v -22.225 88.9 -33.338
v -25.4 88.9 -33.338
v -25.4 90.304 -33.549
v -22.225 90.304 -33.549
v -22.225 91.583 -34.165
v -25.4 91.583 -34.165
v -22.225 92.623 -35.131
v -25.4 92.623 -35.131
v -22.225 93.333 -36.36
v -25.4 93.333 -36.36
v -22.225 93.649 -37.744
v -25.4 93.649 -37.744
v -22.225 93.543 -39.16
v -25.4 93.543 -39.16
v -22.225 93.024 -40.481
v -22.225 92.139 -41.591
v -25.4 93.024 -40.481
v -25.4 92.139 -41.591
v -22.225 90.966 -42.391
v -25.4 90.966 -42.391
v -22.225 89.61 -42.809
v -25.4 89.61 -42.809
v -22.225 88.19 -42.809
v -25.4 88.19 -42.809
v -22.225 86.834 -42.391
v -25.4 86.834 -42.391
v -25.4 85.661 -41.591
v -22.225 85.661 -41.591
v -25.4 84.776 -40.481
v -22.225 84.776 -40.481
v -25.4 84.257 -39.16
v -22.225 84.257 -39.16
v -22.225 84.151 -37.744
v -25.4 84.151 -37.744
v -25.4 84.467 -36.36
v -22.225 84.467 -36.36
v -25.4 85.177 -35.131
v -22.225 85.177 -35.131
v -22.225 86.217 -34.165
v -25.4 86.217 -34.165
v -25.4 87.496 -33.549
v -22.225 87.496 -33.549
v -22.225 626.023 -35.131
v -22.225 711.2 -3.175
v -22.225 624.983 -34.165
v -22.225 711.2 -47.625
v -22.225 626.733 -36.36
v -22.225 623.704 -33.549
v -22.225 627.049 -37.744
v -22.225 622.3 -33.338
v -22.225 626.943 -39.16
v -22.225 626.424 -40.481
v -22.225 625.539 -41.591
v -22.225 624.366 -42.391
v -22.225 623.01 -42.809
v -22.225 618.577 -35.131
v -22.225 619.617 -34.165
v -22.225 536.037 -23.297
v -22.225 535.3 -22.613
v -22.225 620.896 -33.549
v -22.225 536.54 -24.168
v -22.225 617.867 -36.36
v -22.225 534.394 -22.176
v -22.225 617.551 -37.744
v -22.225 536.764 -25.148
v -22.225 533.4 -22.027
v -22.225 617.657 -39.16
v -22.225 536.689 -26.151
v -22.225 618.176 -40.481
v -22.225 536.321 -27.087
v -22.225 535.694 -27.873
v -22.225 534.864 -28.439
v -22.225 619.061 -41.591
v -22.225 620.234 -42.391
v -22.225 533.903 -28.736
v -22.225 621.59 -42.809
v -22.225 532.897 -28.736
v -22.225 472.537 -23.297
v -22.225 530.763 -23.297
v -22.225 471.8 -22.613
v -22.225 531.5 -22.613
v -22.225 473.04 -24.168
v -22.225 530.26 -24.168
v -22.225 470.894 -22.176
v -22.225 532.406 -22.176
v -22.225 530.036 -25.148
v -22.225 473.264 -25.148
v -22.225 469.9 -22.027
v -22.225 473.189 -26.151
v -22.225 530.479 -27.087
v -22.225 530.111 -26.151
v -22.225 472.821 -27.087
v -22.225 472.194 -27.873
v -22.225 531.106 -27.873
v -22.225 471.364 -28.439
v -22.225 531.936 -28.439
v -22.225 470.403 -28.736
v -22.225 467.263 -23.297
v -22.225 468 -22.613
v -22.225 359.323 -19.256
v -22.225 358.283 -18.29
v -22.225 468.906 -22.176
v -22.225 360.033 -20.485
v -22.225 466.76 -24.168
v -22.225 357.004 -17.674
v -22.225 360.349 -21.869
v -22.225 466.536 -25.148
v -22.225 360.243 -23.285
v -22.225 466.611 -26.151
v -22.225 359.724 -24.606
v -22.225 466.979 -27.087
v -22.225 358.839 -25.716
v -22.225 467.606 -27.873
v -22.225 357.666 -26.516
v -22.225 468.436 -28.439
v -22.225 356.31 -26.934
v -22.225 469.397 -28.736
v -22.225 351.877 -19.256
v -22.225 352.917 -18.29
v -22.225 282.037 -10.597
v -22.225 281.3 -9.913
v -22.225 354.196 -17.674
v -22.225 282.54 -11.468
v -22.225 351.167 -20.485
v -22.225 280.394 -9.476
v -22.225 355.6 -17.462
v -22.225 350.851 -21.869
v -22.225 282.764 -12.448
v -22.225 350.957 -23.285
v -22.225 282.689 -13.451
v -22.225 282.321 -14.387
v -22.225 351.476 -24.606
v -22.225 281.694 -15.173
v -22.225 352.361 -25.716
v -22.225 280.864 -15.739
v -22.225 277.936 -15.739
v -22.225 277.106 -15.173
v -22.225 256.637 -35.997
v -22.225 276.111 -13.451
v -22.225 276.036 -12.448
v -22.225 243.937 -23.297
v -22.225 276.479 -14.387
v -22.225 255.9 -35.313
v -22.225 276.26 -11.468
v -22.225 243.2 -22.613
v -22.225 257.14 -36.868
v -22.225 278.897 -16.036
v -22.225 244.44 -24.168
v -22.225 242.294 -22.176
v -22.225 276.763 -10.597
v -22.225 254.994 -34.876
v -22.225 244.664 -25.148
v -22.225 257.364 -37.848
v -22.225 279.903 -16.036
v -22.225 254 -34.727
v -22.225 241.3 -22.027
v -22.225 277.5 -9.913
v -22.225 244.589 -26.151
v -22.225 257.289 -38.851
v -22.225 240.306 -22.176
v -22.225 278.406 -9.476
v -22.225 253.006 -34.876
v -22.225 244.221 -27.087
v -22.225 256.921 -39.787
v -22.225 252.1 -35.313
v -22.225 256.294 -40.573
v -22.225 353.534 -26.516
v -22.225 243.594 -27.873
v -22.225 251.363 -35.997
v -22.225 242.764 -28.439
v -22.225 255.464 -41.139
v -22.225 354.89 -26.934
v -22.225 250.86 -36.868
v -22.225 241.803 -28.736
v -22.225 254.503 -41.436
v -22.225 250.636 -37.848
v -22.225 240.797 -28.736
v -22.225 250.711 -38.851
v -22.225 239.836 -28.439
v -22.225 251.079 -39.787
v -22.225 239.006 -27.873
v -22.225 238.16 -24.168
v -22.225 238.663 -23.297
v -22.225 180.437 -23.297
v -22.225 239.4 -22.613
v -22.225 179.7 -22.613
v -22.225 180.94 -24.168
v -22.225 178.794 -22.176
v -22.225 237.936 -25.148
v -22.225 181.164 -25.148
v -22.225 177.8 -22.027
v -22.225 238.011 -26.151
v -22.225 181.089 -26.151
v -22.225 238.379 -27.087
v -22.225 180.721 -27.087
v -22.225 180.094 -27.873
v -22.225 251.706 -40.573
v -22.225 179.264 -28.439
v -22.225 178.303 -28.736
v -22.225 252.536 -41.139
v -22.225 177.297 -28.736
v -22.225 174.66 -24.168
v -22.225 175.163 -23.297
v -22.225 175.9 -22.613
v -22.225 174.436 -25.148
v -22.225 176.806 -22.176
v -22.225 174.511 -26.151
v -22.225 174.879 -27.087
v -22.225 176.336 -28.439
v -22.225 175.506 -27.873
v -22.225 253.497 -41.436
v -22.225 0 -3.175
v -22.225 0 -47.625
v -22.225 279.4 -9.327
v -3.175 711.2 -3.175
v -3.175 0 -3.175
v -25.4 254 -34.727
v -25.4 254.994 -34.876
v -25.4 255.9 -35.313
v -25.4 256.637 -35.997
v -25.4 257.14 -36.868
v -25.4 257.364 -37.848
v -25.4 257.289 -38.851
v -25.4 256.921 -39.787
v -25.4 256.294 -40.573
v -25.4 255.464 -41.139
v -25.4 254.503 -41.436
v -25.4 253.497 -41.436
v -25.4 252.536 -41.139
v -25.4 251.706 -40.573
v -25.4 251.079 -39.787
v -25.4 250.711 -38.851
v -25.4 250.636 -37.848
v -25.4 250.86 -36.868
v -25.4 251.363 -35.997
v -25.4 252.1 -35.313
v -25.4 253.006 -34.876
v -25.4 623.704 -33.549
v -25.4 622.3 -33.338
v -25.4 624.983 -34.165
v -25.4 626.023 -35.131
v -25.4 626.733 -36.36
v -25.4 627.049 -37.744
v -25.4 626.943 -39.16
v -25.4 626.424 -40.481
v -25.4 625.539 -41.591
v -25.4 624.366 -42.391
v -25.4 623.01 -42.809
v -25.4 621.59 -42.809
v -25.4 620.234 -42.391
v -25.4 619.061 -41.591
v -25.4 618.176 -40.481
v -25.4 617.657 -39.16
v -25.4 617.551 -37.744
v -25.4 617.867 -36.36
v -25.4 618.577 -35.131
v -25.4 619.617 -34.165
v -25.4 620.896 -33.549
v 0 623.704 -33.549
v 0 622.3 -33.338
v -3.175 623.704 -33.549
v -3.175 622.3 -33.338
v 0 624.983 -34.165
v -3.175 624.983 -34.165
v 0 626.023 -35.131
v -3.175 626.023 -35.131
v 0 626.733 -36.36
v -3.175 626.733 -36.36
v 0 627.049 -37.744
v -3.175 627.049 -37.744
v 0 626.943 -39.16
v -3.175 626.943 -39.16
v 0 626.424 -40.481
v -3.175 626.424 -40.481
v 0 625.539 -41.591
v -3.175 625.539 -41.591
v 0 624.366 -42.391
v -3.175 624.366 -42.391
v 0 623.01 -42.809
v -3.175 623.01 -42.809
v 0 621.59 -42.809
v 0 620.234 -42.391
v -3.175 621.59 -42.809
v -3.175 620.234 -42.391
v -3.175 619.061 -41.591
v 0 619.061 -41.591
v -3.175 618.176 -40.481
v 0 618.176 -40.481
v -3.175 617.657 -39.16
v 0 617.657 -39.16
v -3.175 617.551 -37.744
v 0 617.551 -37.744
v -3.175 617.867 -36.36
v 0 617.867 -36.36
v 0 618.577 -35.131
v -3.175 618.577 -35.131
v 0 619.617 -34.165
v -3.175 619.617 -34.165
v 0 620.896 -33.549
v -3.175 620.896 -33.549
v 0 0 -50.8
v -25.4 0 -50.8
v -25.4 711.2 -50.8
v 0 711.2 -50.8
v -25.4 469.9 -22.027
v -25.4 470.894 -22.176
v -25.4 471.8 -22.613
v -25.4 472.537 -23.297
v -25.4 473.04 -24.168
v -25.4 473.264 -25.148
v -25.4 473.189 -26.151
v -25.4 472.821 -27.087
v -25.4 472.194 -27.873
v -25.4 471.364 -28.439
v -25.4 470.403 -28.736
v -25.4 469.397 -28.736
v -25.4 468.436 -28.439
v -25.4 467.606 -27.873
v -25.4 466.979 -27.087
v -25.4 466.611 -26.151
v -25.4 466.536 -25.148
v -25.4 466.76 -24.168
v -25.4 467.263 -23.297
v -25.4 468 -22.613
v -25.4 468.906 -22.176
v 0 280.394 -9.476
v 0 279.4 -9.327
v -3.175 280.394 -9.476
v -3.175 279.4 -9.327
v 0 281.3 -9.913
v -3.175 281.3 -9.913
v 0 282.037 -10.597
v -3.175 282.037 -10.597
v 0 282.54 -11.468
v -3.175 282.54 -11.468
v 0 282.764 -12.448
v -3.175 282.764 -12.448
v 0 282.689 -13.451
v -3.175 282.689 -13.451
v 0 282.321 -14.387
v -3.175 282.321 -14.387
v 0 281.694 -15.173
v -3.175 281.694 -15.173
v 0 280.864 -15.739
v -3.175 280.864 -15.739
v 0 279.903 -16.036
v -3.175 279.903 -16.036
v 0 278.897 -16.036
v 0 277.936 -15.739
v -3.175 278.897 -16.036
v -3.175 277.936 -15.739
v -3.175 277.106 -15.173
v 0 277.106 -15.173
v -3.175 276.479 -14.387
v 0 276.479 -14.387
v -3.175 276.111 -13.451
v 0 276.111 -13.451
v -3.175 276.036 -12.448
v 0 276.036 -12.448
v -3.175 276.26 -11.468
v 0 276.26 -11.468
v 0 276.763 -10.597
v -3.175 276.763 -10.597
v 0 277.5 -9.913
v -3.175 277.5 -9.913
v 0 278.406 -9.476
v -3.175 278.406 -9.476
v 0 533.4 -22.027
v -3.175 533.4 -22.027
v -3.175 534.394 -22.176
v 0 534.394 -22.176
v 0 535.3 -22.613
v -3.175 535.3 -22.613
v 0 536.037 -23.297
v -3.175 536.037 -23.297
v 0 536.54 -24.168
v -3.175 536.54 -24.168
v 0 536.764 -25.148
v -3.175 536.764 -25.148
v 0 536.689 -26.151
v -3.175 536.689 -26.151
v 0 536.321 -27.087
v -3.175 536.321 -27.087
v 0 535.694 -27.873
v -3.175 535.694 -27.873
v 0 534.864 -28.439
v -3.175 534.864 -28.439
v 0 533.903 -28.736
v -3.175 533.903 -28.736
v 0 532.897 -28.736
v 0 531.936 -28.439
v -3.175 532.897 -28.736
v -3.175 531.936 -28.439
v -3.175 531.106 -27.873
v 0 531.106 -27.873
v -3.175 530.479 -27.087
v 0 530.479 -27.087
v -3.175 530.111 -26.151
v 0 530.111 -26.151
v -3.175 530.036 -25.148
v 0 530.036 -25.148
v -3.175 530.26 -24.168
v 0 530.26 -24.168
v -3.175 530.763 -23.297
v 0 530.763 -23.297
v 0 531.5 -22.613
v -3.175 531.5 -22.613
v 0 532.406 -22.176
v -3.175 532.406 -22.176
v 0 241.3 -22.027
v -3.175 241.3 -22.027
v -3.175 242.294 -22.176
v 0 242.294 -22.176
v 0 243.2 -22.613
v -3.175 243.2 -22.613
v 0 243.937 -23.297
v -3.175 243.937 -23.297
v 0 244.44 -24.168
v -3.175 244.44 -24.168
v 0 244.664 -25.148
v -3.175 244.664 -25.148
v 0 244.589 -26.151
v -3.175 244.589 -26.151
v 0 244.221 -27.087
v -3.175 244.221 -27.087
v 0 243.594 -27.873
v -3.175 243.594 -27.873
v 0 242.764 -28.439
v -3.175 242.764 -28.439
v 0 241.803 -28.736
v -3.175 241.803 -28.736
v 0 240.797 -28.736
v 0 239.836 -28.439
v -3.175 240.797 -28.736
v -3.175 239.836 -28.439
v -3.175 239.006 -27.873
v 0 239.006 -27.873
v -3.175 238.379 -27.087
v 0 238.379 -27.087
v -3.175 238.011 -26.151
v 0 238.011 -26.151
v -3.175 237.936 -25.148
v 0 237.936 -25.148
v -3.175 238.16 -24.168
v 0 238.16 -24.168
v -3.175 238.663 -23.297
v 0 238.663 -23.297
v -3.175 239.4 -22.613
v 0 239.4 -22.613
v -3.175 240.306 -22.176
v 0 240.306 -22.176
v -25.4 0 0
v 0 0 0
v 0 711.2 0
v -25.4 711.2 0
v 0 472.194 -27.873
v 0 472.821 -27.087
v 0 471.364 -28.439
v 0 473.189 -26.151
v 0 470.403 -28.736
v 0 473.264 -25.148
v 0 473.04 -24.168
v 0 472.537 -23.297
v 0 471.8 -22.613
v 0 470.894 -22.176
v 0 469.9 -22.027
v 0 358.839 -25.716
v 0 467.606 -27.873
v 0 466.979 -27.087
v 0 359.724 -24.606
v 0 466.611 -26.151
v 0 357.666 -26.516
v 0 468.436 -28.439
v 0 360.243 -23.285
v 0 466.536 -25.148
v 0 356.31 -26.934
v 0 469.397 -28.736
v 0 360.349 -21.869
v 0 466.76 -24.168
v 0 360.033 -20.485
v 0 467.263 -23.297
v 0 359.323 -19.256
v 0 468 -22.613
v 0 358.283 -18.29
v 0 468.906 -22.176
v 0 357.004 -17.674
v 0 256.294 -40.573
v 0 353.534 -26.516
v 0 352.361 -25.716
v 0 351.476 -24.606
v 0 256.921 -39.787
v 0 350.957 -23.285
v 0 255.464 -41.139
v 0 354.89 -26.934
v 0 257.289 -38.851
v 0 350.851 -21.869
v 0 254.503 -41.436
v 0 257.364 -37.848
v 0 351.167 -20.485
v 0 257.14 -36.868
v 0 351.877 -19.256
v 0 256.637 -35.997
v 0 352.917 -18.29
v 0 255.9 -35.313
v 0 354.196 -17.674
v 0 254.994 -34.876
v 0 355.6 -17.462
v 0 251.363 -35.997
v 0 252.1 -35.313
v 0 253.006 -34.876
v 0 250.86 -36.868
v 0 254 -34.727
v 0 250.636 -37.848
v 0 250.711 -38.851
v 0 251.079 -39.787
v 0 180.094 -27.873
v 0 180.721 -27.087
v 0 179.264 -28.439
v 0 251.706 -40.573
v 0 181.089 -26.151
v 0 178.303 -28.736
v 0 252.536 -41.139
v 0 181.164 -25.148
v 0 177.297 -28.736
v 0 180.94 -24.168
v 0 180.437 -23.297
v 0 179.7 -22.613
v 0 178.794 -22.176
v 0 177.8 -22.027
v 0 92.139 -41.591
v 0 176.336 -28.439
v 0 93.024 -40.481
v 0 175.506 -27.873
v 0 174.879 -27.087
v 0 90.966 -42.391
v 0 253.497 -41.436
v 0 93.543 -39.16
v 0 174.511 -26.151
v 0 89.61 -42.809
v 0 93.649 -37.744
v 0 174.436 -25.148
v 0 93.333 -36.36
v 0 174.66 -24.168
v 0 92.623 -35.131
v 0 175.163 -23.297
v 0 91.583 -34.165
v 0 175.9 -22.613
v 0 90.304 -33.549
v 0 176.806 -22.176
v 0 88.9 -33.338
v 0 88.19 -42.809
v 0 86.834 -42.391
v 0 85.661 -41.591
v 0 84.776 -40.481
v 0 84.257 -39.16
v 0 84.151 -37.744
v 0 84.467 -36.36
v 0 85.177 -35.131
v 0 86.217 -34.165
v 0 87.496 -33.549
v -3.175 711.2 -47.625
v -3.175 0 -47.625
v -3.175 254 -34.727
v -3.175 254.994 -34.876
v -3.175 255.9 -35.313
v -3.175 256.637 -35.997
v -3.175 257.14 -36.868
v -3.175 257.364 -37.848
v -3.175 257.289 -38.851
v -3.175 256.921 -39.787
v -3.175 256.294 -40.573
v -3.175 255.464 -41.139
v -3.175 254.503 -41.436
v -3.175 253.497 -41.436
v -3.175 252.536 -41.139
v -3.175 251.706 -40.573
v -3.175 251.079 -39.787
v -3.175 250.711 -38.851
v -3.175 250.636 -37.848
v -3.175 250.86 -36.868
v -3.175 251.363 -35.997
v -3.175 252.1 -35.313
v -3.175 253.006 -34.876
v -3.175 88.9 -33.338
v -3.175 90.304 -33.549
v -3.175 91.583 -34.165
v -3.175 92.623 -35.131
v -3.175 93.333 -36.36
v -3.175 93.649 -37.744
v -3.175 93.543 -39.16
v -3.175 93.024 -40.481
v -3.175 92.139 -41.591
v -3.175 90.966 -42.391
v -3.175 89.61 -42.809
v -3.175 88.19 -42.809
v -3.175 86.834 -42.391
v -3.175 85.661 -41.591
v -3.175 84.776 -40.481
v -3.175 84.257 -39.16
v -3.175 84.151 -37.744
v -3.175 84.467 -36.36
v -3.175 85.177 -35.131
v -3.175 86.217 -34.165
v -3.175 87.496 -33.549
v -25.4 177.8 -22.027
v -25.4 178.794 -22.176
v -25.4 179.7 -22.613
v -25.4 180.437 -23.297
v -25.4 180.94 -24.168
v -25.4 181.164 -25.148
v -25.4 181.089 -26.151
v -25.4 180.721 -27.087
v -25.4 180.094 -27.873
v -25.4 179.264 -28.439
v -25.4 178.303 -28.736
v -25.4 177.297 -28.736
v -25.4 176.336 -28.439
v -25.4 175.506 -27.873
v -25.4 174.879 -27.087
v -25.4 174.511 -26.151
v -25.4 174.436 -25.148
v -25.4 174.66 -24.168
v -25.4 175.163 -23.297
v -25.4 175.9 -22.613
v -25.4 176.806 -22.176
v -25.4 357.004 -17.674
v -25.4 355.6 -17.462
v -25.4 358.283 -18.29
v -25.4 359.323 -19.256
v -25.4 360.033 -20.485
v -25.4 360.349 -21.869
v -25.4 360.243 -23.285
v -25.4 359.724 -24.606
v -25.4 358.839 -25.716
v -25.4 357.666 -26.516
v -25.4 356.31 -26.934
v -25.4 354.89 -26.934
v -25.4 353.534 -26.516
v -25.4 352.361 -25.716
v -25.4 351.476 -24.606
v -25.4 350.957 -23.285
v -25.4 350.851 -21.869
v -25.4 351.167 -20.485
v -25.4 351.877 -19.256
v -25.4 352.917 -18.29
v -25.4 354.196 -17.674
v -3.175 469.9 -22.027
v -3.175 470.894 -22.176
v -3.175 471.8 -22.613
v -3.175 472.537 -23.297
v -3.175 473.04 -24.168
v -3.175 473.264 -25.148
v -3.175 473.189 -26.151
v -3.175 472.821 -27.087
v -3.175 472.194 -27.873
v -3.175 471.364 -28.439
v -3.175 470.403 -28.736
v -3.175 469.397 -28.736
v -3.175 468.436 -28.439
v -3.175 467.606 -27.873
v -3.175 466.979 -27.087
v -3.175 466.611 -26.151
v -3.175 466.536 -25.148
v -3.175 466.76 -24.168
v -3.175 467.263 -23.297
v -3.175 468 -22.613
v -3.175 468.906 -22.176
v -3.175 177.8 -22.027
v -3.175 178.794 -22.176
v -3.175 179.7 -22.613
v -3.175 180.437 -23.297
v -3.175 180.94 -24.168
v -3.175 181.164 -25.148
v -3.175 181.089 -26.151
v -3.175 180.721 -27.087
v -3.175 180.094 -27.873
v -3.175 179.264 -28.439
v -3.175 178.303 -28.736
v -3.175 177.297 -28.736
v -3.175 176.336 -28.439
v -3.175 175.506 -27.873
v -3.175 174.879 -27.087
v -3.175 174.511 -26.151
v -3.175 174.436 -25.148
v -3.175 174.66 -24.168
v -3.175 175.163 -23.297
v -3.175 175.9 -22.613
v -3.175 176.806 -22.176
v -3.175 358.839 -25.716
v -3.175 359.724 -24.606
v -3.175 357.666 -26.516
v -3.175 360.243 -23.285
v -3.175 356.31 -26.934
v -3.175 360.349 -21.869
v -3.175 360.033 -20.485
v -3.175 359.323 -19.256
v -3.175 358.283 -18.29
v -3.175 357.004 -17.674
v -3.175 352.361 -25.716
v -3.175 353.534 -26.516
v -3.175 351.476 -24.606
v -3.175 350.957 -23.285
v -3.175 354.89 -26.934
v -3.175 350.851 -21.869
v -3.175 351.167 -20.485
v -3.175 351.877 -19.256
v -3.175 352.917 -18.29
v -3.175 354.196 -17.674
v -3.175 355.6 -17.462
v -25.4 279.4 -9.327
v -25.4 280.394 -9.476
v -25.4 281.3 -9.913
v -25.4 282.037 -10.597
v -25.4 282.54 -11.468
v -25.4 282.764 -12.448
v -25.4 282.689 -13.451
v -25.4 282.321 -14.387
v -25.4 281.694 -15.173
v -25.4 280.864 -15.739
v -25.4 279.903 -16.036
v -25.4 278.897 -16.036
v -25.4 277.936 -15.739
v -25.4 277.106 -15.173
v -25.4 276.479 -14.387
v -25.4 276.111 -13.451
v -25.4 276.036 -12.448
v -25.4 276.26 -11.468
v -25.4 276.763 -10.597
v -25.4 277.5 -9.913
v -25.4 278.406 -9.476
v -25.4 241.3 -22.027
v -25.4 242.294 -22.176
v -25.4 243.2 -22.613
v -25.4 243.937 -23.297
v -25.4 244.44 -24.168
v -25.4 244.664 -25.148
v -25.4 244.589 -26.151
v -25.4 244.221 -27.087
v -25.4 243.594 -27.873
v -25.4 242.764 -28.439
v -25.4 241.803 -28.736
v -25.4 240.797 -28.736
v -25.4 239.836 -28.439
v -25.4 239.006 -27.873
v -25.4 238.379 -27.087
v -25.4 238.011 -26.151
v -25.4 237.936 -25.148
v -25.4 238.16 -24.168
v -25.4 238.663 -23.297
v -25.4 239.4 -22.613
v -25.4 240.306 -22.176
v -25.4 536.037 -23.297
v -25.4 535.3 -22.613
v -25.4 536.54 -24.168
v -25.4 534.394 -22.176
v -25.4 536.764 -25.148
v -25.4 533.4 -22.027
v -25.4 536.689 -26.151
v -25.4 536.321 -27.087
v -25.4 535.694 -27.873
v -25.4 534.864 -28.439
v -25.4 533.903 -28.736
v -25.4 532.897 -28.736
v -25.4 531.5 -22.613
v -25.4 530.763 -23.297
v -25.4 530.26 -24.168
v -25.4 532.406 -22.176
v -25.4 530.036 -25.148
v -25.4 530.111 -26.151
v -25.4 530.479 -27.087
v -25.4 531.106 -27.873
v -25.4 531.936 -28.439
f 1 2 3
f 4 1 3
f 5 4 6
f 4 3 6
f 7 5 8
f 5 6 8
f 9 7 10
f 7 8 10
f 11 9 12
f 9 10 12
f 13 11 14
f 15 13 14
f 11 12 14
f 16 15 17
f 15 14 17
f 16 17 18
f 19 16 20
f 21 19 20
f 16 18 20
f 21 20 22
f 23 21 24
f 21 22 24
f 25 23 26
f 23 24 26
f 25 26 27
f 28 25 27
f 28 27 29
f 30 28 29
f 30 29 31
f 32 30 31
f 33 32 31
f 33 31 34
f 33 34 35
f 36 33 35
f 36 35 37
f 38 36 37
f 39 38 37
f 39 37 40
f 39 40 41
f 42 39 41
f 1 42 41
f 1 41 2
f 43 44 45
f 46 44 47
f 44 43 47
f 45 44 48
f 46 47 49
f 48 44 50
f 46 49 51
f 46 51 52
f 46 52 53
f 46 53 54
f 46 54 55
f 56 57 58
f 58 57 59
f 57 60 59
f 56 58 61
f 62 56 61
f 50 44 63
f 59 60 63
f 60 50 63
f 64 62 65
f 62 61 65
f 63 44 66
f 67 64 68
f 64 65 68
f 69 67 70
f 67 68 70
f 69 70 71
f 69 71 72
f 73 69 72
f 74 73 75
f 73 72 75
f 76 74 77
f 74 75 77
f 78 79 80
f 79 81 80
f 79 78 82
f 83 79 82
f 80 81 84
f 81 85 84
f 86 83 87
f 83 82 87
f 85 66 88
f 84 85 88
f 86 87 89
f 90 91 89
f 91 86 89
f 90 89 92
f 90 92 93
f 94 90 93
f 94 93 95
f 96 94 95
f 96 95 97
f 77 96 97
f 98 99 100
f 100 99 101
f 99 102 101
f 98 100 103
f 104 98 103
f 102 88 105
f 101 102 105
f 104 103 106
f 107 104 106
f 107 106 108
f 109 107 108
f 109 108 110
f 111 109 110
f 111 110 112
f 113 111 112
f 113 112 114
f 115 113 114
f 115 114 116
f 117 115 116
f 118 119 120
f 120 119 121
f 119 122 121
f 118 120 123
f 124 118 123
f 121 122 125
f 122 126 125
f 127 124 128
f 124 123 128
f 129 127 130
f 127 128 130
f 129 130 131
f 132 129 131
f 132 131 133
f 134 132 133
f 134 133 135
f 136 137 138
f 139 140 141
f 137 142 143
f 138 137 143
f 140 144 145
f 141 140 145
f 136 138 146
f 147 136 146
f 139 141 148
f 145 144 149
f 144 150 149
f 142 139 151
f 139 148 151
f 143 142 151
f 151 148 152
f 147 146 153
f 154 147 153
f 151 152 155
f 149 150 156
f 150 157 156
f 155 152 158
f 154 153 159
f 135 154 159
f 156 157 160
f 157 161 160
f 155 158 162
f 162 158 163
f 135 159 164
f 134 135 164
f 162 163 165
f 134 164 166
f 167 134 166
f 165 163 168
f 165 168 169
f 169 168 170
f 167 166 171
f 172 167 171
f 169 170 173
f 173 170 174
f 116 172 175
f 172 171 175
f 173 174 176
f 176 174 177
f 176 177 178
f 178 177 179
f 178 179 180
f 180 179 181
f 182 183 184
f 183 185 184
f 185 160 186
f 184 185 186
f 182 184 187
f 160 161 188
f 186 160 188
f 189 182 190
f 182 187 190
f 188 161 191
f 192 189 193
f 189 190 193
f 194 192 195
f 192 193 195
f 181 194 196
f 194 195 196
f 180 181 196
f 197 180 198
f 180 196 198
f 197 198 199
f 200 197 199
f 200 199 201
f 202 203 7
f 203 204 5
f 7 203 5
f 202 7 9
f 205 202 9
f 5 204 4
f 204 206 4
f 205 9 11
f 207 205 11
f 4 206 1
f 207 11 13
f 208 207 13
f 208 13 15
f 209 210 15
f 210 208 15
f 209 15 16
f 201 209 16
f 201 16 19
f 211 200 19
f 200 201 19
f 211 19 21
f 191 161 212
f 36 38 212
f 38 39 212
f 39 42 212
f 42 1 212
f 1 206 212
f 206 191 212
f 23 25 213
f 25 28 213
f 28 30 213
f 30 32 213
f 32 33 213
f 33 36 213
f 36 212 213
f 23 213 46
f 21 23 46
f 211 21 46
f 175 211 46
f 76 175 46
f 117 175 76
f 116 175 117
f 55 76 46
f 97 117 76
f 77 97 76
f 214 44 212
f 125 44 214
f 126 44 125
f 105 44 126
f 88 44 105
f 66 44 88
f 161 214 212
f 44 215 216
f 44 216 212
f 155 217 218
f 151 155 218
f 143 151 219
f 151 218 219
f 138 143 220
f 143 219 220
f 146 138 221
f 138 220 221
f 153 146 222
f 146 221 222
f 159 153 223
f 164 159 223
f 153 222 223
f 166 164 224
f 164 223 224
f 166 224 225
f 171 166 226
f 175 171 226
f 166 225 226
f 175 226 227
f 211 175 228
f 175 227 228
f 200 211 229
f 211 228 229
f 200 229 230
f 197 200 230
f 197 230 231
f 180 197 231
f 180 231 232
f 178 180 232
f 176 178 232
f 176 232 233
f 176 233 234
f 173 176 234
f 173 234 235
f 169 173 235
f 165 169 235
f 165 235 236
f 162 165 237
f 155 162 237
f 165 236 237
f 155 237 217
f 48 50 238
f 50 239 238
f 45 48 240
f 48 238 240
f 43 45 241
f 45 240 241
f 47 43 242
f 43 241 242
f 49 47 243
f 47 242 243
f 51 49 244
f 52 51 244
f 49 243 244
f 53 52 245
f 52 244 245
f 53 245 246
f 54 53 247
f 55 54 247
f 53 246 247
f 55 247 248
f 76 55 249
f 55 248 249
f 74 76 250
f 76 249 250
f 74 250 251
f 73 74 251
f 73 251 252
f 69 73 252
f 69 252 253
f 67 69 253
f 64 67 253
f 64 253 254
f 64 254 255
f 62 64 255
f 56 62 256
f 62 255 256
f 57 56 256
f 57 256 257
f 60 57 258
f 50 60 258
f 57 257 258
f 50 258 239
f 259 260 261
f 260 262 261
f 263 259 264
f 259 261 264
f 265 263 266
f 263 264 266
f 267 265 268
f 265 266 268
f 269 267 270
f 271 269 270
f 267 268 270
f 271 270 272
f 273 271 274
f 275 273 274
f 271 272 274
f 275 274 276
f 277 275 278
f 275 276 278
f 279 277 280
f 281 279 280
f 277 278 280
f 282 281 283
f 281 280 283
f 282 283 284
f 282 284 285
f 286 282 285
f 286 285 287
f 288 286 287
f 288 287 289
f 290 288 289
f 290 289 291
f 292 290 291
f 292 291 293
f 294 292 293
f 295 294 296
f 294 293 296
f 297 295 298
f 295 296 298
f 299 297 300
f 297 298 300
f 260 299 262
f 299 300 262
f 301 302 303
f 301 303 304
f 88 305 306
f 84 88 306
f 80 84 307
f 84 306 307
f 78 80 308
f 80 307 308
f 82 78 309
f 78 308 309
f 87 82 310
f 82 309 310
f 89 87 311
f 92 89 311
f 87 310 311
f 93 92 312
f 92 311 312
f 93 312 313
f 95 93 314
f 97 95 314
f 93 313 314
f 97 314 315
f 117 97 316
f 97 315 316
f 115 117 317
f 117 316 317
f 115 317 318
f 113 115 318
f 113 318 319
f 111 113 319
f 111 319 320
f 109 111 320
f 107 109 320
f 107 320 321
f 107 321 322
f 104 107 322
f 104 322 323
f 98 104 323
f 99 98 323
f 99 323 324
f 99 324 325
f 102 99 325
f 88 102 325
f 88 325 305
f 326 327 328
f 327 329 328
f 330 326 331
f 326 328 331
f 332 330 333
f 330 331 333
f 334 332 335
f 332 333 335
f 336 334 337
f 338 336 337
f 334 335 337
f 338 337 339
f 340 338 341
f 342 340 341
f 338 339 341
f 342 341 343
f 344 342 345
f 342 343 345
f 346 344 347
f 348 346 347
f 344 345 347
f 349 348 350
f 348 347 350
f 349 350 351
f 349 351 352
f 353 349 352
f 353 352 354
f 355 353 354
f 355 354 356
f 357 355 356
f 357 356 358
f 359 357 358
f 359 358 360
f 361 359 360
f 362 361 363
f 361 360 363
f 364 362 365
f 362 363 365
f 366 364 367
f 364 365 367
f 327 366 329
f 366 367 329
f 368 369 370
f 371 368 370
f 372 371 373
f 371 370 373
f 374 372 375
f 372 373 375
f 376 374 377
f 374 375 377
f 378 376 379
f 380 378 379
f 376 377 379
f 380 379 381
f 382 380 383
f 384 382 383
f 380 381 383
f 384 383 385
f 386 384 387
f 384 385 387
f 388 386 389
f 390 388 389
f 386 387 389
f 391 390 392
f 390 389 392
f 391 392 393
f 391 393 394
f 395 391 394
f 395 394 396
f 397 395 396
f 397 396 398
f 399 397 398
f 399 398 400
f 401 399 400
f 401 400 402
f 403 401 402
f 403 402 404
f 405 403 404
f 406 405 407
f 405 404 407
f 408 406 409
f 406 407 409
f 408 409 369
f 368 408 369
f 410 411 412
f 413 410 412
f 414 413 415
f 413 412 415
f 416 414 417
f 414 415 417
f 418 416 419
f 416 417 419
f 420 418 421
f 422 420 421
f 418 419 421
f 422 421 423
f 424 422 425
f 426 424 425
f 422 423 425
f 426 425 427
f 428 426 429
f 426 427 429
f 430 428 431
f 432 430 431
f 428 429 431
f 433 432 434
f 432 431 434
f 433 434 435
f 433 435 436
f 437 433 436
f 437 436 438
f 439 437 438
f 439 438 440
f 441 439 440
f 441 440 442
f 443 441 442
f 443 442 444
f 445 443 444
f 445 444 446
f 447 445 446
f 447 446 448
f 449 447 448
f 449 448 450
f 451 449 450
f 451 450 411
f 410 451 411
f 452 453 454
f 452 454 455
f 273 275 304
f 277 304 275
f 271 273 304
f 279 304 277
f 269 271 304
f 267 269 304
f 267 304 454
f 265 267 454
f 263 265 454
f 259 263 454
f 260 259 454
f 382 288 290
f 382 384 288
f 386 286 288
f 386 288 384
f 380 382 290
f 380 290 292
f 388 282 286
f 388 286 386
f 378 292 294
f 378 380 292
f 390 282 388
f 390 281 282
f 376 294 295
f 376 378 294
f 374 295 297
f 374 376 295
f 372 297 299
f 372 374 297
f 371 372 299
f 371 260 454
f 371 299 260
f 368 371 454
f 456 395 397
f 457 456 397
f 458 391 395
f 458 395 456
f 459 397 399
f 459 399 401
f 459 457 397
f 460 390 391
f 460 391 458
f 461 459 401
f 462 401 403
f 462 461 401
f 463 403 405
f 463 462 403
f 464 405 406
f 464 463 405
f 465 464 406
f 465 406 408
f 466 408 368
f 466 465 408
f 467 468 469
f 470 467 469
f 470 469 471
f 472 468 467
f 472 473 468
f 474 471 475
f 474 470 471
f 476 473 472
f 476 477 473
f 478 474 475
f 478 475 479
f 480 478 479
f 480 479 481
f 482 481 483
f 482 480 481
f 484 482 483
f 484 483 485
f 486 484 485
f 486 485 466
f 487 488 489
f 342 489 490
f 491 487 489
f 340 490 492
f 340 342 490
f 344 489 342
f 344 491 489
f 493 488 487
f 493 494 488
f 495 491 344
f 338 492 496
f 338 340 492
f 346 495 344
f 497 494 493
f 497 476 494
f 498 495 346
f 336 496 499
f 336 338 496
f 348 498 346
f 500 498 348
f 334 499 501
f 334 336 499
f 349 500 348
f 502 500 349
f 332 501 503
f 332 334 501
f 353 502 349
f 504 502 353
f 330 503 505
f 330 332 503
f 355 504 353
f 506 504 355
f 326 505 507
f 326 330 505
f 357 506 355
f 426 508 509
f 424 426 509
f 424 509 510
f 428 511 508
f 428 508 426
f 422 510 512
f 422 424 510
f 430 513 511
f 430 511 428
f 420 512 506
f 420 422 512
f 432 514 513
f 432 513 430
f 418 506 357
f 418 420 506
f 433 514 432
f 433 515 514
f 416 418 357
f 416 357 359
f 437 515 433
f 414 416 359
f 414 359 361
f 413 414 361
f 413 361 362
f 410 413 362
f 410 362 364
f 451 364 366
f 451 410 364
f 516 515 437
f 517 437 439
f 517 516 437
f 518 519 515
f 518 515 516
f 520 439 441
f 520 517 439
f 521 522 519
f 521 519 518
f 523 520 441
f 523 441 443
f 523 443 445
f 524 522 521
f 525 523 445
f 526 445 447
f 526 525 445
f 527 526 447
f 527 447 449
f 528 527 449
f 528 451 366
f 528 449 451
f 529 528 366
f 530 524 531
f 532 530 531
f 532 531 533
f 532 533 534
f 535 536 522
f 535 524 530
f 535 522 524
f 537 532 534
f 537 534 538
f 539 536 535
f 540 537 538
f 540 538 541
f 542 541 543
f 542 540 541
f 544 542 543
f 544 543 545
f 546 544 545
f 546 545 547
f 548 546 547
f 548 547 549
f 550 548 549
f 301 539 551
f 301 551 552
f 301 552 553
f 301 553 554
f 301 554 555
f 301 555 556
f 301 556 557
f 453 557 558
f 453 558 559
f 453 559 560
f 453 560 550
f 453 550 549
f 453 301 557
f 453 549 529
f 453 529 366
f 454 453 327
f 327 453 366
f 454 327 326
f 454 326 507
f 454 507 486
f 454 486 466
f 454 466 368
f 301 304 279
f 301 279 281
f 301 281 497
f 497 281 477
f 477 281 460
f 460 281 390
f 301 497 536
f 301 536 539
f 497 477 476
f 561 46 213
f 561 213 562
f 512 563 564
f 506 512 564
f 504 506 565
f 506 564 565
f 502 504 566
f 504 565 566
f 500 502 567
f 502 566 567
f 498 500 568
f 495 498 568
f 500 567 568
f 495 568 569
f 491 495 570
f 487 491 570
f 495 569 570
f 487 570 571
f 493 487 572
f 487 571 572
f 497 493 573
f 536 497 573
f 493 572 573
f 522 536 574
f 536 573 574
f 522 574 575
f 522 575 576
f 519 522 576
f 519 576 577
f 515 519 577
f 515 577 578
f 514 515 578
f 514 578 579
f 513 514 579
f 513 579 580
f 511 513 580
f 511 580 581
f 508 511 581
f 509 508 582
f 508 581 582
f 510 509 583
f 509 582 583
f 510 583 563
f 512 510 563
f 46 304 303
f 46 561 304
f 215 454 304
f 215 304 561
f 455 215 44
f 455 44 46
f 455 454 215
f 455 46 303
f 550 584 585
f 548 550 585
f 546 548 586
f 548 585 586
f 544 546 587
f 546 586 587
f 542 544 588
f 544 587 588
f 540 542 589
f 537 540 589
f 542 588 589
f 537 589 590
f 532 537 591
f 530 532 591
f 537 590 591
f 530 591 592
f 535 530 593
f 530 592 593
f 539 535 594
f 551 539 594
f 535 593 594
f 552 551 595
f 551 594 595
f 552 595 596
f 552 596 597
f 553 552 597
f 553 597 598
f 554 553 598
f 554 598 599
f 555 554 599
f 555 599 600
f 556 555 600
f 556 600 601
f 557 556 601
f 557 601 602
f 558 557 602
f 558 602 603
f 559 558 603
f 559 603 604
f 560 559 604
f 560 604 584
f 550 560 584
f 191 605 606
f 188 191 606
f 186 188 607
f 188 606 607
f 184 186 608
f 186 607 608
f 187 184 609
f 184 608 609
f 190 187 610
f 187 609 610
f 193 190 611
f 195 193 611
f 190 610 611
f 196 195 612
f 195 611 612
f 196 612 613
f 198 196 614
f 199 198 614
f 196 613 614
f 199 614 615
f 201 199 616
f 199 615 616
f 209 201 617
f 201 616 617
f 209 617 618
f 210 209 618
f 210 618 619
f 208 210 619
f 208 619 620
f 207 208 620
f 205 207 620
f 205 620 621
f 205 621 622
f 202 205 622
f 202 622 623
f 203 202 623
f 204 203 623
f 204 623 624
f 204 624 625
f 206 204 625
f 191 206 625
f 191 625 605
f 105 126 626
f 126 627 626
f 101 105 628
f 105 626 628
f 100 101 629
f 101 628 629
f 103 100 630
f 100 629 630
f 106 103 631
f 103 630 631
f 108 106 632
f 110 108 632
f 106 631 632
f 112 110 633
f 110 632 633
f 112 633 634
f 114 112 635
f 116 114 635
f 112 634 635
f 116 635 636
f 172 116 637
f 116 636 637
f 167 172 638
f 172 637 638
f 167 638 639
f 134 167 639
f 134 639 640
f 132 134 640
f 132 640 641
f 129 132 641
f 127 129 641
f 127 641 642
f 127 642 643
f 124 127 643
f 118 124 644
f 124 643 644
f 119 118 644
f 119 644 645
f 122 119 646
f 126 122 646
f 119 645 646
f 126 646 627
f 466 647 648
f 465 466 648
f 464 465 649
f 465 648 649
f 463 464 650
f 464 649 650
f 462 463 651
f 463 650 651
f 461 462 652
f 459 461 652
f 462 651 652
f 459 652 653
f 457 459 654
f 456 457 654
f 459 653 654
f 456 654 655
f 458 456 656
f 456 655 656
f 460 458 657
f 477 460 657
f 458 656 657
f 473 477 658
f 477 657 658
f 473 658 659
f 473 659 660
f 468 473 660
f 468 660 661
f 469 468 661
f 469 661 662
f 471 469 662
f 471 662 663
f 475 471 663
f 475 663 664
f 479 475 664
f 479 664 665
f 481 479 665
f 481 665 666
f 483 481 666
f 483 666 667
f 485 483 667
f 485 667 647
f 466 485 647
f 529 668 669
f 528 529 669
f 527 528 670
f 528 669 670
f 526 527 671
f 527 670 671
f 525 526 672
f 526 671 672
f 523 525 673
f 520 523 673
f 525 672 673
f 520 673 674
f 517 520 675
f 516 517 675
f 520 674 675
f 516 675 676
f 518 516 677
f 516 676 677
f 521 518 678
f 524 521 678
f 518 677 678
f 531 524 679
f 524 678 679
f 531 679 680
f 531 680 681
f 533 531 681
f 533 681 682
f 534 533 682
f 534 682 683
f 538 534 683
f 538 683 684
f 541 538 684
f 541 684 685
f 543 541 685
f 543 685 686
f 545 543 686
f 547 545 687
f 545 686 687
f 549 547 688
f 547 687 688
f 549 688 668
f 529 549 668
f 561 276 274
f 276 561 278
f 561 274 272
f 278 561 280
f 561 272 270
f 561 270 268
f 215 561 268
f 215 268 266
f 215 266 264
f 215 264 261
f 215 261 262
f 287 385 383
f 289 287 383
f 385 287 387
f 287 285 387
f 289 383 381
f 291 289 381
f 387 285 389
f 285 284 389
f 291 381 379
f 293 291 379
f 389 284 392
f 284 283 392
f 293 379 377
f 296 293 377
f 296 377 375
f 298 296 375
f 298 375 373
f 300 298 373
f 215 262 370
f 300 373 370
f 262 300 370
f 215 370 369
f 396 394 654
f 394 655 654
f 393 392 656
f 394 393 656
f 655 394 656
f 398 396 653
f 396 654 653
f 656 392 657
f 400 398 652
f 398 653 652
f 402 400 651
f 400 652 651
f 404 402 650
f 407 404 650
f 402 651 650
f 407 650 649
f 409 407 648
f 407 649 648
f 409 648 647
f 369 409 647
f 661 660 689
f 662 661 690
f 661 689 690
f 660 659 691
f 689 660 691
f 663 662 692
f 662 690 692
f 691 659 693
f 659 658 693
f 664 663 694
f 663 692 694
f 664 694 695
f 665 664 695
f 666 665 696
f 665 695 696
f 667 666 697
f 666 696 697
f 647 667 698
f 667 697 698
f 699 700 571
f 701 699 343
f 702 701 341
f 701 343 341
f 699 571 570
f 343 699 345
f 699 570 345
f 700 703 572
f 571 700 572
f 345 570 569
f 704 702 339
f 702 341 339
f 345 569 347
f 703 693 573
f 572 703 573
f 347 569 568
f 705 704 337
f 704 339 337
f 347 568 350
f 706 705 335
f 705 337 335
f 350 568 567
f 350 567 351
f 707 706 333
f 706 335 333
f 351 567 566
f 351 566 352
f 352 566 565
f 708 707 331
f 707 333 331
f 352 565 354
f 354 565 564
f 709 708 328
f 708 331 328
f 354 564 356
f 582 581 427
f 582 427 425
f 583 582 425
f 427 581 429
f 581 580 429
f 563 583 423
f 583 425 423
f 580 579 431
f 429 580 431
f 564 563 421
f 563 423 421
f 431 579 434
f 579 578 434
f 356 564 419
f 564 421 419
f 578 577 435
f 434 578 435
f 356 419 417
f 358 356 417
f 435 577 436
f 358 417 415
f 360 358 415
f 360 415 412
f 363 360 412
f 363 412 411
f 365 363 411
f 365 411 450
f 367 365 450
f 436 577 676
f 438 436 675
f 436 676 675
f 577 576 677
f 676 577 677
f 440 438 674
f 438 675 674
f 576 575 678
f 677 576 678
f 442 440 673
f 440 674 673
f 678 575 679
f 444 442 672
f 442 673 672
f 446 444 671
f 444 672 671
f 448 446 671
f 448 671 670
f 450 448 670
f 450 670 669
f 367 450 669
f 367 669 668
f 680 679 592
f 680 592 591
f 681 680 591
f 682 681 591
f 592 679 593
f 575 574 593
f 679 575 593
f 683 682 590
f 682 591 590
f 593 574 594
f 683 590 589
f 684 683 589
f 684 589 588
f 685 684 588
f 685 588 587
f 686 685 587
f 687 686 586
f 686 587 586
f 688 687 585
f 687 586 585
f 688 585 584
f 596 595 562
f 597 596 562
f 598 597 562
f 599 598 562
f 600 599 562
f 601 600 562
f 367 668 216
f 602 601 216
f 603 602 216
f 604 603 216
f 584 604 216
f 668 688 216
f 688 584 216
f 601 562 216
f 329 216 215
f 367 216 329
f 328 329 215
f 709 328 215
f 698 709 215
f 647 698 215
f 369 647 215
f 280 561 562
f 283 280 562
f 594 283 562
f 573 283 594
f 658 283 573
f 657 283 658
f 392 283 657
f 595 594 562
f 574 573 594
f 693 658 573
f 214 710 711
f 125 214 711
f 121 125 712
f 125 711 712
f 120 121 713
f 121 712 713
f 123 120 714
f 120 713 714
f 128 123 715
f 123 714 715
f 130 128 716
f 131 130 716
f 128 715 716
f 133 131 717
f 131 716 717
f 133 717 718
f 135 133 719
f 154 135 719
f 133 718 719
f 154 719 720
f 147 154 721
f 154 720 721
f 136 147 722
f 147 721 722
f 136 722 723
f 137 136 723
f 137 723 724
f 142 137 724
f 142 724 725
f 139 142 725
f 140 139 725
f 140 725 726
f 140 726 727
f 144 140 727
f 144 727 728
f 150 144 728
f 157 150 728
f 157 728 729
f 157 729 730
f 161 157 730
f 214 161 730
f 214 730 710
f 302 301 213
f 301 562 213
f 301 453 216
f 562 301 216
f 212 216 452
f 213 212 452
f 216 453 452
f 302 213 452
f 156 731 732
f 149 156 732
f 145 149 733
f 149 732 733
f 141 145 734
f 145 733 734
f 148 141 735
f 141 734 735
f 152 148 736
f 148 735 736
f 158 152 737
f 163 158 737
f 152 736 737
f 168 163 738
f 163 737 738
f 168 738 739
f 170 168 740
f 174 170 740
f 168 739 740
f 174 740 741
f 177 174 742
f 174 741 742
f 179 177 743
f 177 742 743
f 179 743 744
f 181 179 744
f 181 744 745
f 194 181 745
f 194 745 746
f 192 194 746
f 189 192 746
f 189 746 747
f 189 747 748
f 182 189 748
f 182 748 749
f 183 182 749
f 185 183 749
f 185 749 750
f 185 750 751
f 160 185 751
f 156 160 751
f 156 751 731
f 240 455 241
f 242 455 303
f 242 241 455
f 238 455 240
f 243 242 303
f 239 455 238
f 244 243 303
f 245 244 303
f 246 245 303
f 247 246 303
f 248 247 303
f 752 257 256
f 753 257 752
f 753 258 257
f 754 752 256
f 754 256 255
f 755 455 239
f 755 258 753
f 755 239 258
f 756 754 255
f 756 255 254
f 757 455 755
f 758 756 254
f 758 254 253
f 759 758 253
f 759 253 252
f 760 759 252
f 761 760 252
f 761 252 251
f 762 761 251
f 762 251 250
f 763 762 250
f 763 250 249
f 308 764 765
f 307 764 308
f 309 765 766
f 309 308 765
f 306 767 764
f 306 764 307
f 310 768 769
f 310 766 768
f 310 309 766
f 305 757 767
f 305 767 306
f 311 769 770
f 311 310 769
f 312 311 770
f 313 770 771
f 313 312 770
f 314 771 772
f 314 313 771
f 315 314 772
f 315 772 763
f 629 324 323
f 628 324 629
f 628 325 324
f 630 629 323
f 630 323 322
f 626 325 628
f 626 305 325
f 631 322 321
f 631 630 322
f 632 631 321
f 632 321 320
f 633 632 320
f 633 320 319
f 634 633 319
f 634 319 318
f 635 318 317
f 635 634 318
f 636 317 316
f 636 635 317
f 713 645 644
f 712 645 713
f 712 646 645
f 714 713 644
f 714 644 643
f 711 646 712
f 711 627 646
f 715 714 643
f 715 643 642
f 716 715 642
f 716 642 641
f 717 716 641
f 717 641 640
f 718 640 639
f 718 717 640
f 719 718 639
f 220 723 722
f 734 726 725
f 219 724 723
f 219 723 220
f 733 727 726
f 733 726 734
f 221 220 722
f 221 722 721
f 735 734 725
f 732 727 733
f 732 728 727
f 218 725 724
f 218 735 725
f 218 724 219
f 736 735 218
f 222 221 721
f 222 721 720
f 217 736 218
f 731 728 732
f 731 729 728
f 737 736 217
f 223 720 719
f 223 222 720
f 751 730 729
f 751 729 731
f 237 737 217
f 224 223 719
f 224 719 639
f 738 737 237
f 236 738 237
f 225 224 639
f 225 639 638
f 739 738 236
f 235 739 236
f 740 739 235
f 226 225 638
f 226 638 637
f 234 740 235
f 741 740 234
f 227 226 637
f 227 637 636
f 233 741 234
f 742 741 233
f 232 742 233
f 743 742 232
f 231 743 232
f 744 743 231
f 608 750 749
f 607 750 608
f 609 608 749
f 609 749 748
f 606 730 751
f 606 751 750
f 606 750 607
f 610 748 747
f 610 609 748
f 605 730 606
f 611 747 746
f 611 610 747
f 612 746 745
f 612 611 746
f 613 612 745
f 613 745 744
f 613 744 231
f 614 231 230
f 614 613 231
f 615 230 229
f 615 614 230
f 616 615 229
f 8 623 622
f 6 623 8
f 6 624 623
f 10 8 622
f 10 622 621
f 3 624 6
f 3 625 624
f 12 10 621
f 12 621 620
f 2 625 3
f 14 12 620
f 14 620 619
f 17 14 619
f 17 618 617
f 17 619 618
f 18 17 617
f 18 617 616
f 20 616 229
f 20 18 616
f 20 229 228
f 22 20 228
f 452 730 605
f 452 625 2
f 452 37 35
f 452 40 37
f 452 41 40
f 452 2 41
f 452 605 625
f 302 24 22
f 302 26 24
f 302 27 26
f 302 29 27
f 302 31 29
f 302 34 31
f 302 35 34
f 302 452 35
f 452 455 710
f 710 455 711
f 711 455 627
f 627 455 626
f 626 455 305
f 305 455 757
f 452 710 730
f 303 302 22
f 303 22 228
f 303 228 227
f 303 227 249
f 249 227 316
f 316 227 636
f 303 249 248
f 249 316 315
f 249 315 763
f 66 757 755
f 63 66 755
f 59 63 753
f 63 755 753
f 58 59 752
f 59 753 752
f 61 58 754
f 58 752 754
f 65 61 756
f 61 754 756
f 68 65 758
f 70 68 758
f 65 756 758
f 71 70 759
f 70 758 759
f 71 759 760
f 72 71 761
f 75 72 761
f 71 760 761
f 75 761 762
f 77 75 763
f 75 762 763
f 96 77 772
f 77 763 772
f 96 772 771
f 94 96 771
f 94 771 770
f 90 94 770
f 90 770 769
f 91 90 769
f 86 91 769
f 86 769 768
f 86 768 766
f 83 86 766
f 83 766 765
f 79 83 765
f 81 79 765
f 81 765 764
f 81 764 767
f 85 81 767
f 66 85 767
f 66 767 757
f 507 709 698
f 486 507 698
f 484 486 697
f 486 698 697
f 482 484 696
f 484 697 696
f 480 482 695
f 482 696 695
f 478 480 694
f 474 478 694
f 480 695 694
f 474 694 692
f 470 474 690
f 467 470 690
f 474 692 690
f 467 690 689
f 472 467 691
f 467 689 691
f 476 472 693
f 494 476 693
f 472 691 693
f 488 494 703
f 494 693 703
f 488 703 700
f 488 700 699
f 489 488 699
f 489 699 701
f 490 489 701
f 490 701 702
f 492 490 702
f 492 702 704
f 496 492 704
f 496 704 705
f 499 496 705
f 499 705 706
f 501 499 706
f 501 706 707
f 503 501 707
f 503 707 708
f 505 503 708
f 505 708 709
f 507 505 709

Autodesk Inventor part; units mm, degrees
ref_plane "YZ Plane" through (0, 0, 0) normal (1, 0, 0) x (0, 1, 0)
ref_plane "XZ Plane" through (0, 0, 0) normal (0, 1, 0) x (-1, 0, 0)
ref_plane "XY Plane" through (0, 0, 0) normal (0, 0, 1) x (1, 0, 0)
sketch "Sketch1" plane through (0, 0, 0) normal (0, 1, 0) x (-1, 0, 0)
  line L0 (0, 0) -> (25.4, 0)
  line L1 (25.4, 0) -> (25.4, -50.8)
  line L2 (25.4, -50.8) -> (0, -50.8)
  line L3 (0, -50.8) -> (0, 0)
  line L4 (3.175, -3.175) -> (22.225, -3.175)
  line L5 (22.225, -3.175) -> (22.225, -47.625)
  line L6 (22.225, -47.625) -> (3.175, -47.625)
  line L7 (3.175, -47.625) -> (3.175, -3.175)
  dimension "d0" = 25.4
  dimension "d1" = 50.8
  dimension "d2" = 3.175
extrude "Extrusion1" add sketch "Sketch1" along normal blind 711.2
sketch "Sketch2" plane through (-25.4, 0, -50.8) normal (-1, 0, 0) x (0, 0, 1)
  circle A0 centre (28.575, 355.6) radius 4.7625
  line L0 (0, 711.2) -> (50.8, 711.2) projected
  line L1 (0, 0) -> (0, 711.2) projected
  circle A1 centre (12.7, 622.3) radius 4.7625
  line L2 (50.8, 0) -> (50.8, 711.2) projected
  circle A2 centre (12.7, 88.9) radius 4.7625
  line L3 (0, 88.9) -> (50.8, 88.9) construction
  line L4 (50.8, 0) -> (50.8, 711.2) projected
  line L5 (0, 622.3) -> (50.8, 622.3) construction
  circle A3 centre (25.4, 177.8) radius 3.3734
  line L6 (50.8, 0) -> (0, 0) projected
  circle A4 centre (25.4, 241.3) radius 3.3734
  circle A5 centre (25.4, 533.4) radius 3.3734
  circle A6 centre (25.4, 469.9) radius 3.3734
  circle A7 centre (12.7, 254) radius 3.3734
  circle A8 centre (38.1, 279.4) radius 3.3734
  dimension "d6" = 355.6
  dimension "d7" = 28.575
  dimension "d10" = 9.525
  dimension "d11" = 38.1
  dimension "d14" = 38.1
  dimension "d16" = 266.7
  dimension "d17" = 266.7
  dimension "d18" = 6.7469
  dimension "d19" = 25.4
  dimension "d20" = 177.8
  dimension "d22" = 241.3
  dimension "d23" = 25.4
  dimension "d25" = 25.4
  dimension "d26" = 177.8
  dimension "d28" = 25.4
  dimension "d29" = 241.3
  dimension "d30" = 6.7469
  dimension "d31" = 6.7469
  dimension "d32" = 12.7
  dimension "d33" = 12.7
  dimension "d34" = 25.4
  dimension "d35" = 38.1
  dimension "d38" = 63.5
extrude "Extrusion2" cut sketch "Sketch2" against normal blind 25.4 contours A0 | A1 | A2 | A3 | A4 | A5 | A6
extrude "Extrusion3" cut sketch "Sketch2" against normal blind 25.4 contours A7 | A8
properties part number "1x2x28" material "Aluminum 6061"
